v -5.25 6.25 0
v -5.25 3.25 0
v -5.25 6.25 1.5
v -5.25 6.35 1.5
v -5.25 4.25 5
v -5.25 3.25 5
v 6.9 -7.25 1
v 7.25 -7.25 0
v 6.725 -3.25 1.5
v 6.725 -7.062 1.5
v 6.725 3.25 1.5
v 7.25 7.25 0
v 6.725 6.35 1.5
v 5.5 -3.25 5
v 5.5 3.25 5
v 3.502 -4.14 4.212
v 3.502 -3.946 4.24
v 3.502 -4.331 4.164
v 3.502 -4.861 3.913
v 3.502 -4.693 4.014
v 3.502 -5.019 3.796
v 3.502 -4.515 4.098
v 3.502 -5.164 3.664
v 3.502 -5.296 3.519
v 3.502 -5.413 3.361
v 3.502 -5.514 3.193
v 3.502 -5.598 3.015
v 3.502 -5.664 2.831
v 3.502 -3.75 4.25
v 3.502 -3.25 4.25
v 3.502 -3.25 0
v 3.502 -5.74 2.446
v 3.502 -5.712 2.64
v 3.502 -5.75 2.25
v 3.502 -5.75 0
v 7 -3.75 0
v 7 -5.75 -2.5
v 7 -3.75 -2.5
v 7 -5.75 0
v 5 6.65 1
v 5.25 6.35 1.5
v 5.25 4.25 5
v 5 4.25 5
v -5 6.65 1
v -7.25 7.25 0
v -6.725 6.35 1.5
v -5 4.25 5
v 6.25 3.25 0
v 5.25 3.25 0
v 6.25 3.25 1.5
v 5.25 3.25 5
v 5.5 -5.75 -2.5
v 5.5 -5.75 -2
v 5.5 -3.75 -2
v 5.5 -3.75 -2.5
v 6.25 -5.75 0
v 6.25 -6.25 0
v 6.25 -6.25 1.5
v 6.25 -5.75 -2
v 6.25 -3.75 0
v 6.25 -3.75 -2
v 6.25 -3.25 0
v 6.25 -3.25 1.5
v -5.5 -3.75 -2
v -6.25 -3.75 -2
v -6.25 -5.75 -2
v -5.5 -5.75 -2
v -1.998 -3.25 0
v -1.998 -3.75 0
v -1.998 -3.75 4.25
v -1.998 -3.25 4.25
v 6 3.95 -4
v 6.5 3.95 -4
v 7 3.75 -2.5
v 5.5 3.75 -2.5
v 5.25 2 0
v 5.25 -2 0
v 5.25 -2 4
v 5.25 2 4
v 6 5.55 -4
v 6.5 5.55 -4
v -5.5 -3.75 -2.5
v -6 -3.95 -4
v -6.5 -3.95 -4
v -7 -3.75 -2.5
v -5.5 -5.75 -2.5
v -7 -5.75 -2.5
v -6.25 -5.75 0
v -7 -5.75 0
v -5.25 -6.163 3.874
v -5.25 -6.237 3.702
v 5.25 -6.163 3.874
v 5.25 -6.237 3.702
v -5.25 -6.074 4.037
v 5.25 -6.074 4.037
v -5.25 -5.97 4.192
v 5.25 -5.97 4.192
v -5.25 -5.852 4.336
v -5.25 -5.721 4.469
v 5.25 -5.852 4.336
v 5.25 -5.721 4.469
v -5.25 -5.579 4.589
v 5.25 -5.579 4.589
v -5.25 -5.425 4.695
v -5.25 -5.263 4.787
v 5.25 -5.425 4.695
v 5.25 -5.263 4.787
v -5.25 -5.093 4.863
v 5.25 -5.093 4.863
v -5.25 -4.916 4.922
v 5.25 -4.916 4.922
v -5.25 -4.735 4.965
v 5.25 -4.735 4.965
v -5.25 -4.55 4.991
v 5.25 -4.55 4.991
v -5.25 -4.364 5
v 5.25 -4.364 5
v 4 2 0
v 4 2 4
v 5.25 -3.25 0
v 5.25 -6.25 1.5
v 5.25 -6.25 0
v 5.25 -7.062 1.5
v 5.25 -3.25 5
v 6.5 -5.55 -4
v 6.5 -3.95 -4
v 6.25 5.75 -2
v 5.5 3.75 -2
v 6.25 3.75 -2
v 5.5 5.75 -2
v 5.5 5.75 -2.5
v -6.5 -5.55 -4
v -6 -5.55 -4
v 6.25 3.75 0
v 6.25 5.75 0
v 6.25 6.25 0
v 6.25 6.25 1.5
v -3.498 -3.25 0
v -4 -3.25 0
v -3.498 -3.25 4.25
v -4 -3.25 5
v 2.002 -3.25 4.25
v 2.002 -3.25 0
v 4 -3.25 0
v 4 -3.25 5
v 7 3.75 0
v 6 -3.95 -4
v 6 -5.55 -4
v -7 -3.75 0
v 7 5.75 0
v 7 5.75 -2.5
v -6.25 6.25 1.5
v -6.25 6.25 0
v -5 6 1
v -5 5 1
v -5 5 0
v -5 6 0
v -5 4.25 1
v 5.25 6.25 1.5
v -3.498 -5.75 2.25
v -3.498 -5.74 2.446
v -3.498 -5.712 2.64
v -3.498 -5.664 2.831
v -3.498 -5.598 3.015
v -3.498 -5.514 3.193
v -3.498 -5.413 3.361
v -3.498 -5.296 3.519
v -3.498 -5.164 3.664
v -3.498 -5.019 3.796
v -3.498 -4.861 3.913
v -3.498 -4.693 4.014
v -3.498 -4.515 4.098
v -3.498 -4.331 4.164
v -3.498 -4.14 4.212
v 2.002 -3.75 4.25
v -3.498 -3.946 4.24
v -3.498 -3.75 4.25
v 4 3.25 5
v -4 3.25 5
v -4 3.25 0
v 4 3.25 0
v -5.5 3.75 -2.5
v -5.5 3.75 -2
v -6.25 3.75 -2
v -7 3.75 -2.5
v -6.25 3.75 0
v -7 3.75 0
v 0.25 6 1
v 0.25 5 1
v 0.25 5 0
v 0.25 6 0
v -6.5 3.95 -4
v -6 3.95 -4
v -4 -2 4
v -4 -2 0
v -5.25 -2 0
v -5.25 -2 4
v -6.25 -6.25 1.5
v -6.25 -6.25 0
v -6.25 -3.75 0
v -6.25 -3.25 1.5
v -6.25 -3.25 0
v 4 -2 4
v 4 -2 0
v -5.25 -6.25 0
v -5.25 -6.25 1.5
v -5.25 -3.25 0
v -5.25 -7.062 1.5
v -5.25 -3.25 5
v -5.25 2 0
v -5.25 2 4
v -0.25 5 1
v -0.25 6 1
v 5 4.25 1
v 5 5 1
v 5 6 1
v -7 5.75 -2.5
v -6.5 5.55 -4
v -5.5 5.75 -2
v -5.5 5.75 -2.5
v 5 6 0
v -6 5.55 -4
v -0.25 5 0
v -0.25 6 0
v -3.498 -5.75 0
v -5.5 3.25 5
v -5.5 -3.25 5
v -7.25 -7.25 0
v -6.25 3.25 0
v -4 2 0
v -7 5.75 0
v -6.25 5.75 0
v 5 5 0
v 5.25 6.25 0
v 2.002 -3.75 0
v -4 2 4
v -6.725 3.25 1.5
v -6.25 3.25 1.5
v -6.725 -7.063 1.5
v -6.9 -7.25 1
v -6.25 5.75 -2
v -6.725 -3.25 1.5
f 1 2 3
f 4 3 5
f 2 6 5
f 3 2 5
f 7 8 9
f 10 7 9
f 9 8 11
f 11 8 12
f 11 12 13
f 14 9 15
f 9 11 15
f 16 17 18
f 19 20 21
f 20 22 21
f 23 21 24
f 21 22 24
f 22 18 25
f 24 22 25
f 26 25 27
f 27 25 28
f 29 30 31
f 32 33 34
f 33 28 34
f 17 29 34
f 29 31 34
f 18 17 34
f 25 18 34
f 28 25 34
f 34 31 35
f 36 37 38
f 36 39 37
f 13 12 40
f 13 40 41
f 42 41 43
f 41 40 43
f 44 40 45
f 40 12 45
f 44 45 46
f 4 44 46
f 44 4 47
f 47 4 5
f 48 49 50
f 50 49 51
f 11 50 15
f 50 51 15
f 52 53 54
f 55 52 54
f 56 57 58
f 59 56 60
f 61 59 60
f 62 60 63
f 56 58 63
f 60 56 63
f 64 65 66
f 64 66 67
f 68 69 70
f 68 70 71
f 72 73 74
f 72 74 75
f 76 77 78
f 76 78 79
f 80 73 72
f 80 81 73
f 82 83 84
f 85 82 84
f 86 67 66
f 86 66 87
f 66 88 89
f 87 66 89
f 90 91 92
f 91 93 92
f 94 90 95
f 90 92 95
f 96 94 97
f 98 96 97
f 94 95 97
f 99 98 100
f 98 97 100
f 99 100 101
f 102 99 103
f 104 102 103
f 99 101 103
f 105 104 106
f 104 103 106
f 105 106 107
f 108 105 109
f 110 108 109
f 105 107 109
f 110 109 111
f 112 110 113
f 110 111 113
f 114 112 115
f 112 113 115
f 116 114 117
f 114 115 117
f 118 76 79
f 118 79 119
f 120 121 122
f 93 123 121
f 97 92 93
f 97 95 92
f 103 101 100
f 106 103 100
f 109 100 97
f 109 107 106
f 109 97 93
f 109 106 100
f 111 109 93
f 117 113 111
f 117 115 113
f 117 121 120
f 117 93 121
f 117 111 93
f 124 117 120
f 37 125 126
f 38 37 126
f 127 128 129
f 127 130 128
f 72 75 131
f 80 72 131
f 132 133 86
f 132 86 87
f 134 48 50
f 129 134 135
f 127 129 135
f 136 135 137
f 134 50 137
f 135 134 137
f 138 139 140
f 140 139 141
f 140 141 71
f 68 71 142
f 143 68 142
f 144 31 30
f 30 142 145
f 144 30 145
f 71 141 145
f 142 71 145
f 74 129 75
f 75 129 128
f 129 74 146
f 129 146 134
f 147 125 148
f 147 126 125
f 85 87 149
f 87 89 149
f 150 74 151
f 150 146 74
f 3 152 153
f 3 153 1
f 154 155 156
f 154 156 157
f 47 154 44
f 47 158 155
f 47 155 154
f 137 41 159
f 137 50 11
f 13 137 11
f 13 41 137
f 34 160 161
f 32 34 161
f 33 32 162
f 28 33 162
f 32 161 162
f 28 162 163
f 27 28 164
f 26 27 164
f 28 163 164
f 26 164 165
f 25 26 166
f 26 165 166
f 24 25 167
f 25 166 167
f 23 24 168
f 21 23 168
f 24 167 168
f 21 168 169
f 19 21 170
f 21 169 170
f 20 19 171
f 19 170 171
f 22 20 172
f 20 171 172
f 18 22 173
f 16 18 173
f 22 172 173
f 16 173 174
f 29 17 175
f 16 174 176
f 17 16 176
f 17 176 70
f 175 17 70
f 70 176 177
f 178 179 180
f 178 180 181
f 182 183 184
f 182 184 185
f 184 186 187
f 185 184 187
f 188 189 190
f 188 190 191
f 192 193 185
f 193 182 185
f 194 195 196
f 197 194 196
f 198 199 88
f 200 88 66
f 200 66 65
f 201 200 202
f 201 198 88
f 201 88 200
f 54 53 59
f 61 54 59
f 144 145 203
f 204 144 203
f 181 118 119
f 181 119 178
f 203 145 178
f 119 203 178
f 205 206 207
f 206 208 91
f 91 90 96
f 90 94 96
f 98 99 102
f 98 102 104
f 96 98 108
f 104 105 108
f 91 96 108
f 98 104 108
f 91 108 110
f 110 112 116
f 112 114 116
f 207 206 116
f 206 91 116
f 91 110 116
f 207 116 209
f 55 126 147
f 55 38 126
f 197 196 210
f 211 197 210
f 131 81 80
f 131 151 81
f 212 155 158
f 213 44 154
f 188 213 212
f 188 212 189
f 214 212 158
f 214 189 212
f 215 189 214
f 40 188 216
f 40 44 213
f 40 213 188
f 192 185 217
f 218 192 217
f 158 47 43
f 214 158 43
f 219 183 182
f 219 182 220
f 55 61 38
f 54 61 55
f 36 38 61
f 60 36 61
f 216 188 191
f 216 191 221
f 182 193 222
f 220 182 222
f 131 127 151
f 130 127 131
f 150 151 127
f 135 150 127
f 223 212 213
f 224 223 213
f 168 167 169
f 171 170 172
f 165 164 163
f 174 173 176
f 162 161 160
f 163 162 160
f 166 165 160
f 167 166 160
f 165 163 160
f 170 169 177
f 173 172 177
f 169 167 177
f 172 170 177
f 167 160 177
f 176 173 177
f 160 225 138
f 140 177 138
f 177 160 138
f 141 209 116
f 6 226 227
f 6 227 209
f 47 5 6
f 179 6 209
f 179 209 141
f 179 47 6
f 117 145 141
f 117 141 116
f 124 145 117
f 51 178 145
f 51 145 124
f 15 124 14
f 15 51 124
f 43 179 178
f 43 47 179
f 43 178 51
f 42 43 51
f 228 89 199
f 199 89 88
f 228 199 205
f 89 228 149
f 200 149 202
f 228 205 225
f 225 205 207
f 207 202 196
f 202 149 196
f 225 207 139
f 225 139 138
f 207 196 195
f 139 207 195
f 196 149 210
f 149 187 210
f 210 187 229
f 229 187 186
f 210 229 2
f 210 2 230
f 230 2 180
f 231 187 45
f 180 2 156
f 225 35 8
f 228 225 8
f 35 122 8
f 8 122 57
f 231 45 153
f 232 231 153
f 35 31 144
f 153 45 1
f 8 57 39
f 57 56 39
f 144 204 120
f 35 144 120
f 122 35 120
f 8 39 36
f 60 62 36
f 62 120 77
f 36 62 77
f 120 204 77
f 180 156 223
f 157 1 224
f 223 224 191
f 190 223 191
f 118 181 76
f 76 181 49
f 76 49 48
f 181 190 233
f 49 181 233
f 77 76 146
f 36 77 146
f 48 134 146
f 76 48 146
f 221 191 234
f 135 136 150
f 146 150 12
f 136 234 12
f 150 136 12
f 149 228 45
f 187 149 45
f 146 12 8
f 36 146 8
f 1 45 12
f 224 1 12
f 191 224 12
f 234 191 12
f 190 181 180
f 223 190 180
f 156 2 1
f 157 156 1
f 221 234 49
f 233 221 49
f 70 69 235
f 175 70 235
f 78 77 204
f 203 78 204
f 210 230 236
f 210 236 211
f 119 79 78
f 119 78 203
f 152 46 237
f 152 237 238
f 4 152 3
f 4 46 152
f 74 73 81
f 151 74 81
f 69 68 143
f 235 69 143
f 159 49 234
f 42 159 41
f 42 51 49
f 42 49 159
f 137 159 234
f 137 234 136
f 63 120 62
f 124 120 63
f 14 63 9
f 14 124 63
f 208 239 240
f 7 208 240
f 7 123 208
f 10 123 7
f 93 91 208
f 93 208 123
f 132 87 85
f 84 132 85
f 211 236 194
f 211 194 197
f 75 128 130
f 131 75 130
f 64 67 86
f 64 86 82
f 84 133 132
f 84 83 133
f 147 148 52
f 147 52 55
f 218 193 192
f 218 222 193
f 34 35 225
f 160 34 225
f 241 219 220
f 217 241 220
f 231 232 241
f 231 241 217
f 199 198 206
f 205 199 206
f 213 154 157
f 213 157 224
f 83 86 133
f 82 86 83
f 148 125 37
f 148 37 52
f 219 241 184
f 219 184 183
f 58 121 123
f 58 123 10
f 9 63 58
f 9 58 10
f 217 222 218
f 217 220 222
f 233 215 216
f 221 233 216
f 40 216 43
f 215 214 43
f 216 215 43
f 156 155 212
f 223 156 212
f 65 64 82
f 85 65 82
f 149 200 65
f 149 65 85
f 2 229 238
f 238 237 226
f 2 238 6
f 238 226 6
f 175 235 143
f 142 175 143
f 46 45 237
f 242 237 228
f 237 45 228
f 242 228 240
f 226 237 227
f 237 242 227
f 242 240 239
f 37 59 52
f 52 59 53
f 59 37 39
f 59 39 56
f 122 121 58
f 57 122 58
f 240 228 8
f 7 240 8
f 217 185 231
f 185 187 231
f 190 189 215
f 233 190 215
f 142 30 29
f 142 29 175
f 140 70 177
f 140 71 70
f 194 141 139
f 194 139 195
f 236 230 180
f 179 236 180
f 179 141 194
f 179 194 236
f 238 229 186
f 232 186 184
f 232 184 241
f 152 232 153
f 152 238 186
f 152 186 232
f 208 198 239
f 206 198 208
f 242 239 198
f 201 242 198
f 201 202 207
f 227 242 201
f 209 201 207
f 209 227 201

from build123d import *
from OCP.BRepFilletAPI import BRepFilletAPI_MakeChamfer

# Parameters (mm, degrees)
ESQUISSE1_W             = 14.5
ESQUISSE1_H             = 14.5
BOSS_EXTRU_1_DEPTH      = 5
ESQUISSE2_W             = 8
ESQUISSE2_H             = 6.5
ENL_V_MAT_EXTRU_1_DEPTH = 12.407234547
CHANFREIN1_SIZE         = 5
CHANFREIN1_SIZE_2       = 1.75
CHANFREIN2_SIZE         = 5
CHANFREIN2_SIZE_2       = 3
ESQUISSE3_W             = 2
ESQUISSE3_H             = 4
ENL_V_MAT_EXTRU_2_DEPTH = 3.5
ESQUISSE6_W             = 10
ESQUISSE6_H             = 3
ENL_V_MAT_EXTRU_3_DEPTH = 4
CHANFREIN3_SIZE         = 4
CHANFREIN3_SIZE2        = 1.5
CONG_1_R                = 2
ESQUISSE7_W             = 1.25
ESQUISSE7_H             = 4
ENL_V_MAT_EXTRU_4_DEPTH = 4
ESQUISSE8_W             = 1.5
ESQUISSE8_H             = 2
BOSS_EXTRU_2_DEPTH      = 4
CHANFREIN4_SIZE         = 0.2
CHANFREIN4_SIZE2        = 1.5
CHANFREIN5_SIZE         = 1.5
CHANFREIN5_SIZE2        = 0.2
CHANFREIN6_SIZE         = 0.5
CHANFREIN6_SIZE2        = 1.5
CHANFREIN7_SIZE         = 1.5
CHANFREIN7_SIZE2        = 0.5
ESQUISSE9_W             = 1
ESQUISSE9_H             = 3
ENL_V_MAT_EXTRU_5_DEPTH = 3.5
ESQUISSE10_W            = 4.75
ESQUISSE10_H            = 1
ENL_V_MAT_EXTRU_6_DEPTH = 12.407234547
ESQUISSE11_W            = 1.5
ESQUISSE11_H            = 0.5
ENL_V_MAT_EXTRU_7_DEPTH = 4.25
CONG_2_START            = -3.497851783
CONG_2_DEPTH            = 7


with BuildPart() as part:
    # Esquisse1 → Boss.-Extru.1 (new body)
    with BuildSketch(Plane.XY):
        Rectangle(ESQUISSE1_W, ESQUISSE1_H)
    extrude(amount=BOSS_EXTRU_1_DEPTH)

    # Esquisse2 → Enlèv. mat.-Extru.1 (cut, through all)
    with BuildSketch(Plane.XY.offset(5)):
        Rectangle(ESQUISSE2_W, ESQUISSE2_H)
    extrude(amount=-ENL_V_MAT_EXTRU_1_DEPTH, mode=Mode.SUBTRACT)

    # Chanfrein1
    # the kernel refuses this chamfer: 5, 1.75 mm, written as the material it takes off along each edge
    with BuildSketch(Plane(origin=(7.25, 20.222980747, 5), x_dir=(0, 0, -1), z_dir=(0, -1, 0)), Plane(origin=(-7.25, -20.222980747, 5), x_dir=(0, 0, -1), z_dir=(0, 1, 0))) as chanfrein1_piece_1:
        Polygon((CHANFREIN1_SIZE, 0), (0, -CHANFREIN1_SIZE_2), (0, 0), align=None)
    extrude(amount=40.445961493, mode=Mode.SUBTRACT)

    # Chanfrein2
    # the kernel refuses this chamfer: 5, 3 mm, written as the material it takes off along each edge
    with BuildSketch(Plane(origin=(-18.431305486, 7.25, 5), x_dir=(0, 0, -1), z_dir=(1, 0, 0))) as chanfrein2_piece_1:
        Polygon((CHANFREIN2_SIZE, 0), (0, -CHANFREIN2_SIZE_2), (0, 0), align=None)
    extrude(amount=36.862610972, mode=Mode.SUBTRACT)

    # Esquisse3 → Enlèv. mat.-Extru.2 (cut)
    with BuildSketch(Plane.XY.offset(5)):
        with Locations((-6.25, 5.25)):
            Rectangle(ESQUISSE3_W, ESQUISSE3_H)
        with Locations((6.25, 5.25)):
            Rectangle(ESQUISSE3_W, ESQUISSE3_H)
        with Locations((6.25, -5.25)):
            Rectangle(ESQUISSE3_W, ESQUISSE3_H)
        with Locations((-6.25, -5.25)):
            Rectangle(ESQUISSE3_W, ESQUISSE3_H)
    extrude(amount=-ENL_V_MAT_EXTRU_2_DEPTH, mode=Mode.SUBTRACT)

    # Esquisse6 → Enlèv. mat.-Extru.3 (cut)
    with BuildSketch(Plane.XY.offset(5)):
        with Locations((0, 5.75)):
            Rectangle(ESQUISSE6_W, ESQUISSE6_H)
    extrude(amount=-ENL_V_MAT_EXTRU_3_DEPTH, mode=Mode.SUBTRACT)

    # Chanfrein3
    chanfrein3_edges = [part.edges().sort_by_distance(p)[0] for p in [
        (0, -7.25, 5),
    ]]
    chanfrein3_side = [part.faces().sort_by_distance(p)[0] for p in [
        (0, -7.25, 2.338531514),
    ]]
    chamfer(chanfrein3_edges, length=CHANFREIN3_SIZE, length2=CHANFREIN3_SIZE2, reference=chanfrein3_side[0])

    # Congé1
    cong_1_edges = [part.edges().sort_by_distance(p)[0] for p in [
        (0, -5.75, 5),
    ]]
    fillet(cong_1_edges, radius=CONG_1_R)

    # Esquisse7 → Enlèv. mat.-Extru.4 (cut)
    with BuildSketch(Plane(origin=(0, 0, 0), x_dir=(-1, 0, 0), z_dir=(0, 0, -1))):
        with Locations((-4.625, 0)):
            Rectangle(ESQUISSE7_W, ESQUISSE7_H)
        with Locations((4.625, 0)):
            Rectangle(ESQUISSE7_W, ESQUISSE7_H)
    extrude(amount=-ENL_V_MAT_EXTRU_4_DEPTH, mode=Mode.SUBTRACT)

    # Esquisse8 → Boss.-Extru.2 (add)
    with BuildSketch(Plane(origin=(0, 0, 0), x_dir=(-1, 0, 0), z_dir=(0, 0, -1))):
        with Locations((-6.25, 4.75)):
            Rectangle(ESQUISSE8_W, ESQUISSE8_H)
        with Locations((6.25, 4.75)):
            Rectangle(ESQUISSE8_W, ESQUISSE8_H)
        with Locations((6.25, -4.75)):
            Rectangle(ESQUISSE8_W, ESQUISSE8_H)
        with Locations((-6.25, -4.75)):
            Rectangle(ESQUISSE8_W, ESQUISSE8_H)
    extrude(amount=BOSS_EXTRU_2_DEPTH)

    # Chanfrein4: one chamfer whose edges measure the first distance from different faces: ONE call of the kernel's chamfer builder (chamfer() names one face for all edges)
    chanfrein4_edges_1 = [part.edges().sort_by_distance(p)[0] for p in [
        (6.25, 5.75, -4),
    ]]
    chanfrein4_side_1 = [part.faces().sort_by_distance(p)[0] for p in [
        (6.25, 4.75, -4),
    ]]
    chanfrein4_edges_2 = [part.edges().sort_by_distance(p)[0] for p in [
        (-6.25, 3.75, -4),
        (-6.25, 5.75, -4),
    ]]
    chanfrein4_side_2 = [part.faces().sort_by_distance(p)[0] for p in [
        (-6.25, 4.75, -4),
    ]]
    chanfrein4_edges_3 = [part.edges().sort_by_distance(p)[0] for p in [
        (6.25, -3.75, -4),
    ]]
    chanfrein4_side_3 = [part.faces().sort_by_distance(p)[0] for p in [
        (6.25, -4.75, -4),
    ]]
    chanfrein4 = BRepFilletAPI_MakeChamfer(part.part.solid().wrapped)
    for e in chanfrein4_edges_1:
        chanfrein4.Add(CHANFREIN4_SIZE, CHANFREIN4_SIZE2, e.wrapped, chanfrein4_side_1[0].wrapped)  # the first distance lies on this face
    for e in chanfrein4_edges_2:
        chanfrein4.Add(CHANFREIN4_SIZE, CHANFREIN4_SIZE2, e.wrapped, chanfrein4_side_2[0].wrapped)  # the first distance lies on this face
    for e in chanfrein4_edges_3:
        chanfrein4.Add(CHANFREIN4_SIZE, CHANFREIN4_SIZE2, e.wrapped, chanfrein4_side_3[0].wrapped)  # the first distance lies on this face
    add(Compound.cast(chanfrein4.Shape()), mode=Mode.REPLACE)

    # Chanfrein5: one chamfer whose edges measure the first distance from different faces: ONE call of the kernel's chamfer builder (chamfer() names one face for all edges)
    chanfrein5_edges_1 = [part.edges().sort_by_distance(p)[0] for p in [
        (6.25, 3.75, -4),
    ]]
    chanfrein5_side_1 = [part.faces().sort_by_distance(p)[0] for p in [
        (6.25, 3.75, -2),
    ]]
    chanfrein5_edges_2 = [part.edges().sort_by_distance(p)[0] for p in [
        (-6.25, -5.75, -4),
    ]]
    chanfrein5_side_2 = [part.faces().sort_by_distance(p)[0] for p in [
        (-6.25, -5.75, -2),
    ]]
    chanfrein5_edges_3 = [part.edges().sort_by_distance(p)[0] for p in [
        (-6.25, -3.75, -4),
    ]]
    chanfrein5_side_3 = [part.faces().sort_by_distance(p)[0] for p in [
        (-6.25, -3.75, -2),
    ]]
    chanfrein5_edges_4 = [part.edges().sort_by_distance(p)[0] for p in [
        (6.25, -5.75, -4),
    ]]
    chanfrein5_side_4 = [part.faces().sort_by_distance(p)[0] for p in [
        (6.25, -5.75, -2),
    ]]
    chanfrein5 = BRepFilletAPI_MakeChamfer(part.part.solid().wrapped)
    for e in chanfrein5_edges_1:
        chanfrein5.Add(CHANFREIN5_SIZE, CHANFREIN5_SIZE2, e.wrapped, chanfrein5_side_1[0].wrapped)  # the first distance lies on this face
    for e in chanfrein5_edges_2:
        chanfrein5.Add(CHANFREIN5_SIZE, CHANFREIN5_SIZE2, e.wrapped, chanfrein5_side_2[0].wrapped)  # the first distance lies on this face
    for e in chanfrein5_edges_3:
        chanfrein5.Add(CHANFREIN5_SIZE, CHANFREIN5_SIZE2, e.wrapped, chanfrein5_side_3[0].wrapped)  # the first distance lies on this face
    for e in chanfrein5_edges_4:
        chanfrein5.Add(CHANFREIN5_SIZE, CHANFREIN5_SIZE2, e.wrapped, chanfrein5_side_4[0].wrapped)  # the first distance lies on this face
    add(Compound.cast(chanfrein5.Shape()), mode=Mode.REPLACE)

    # Chanfrein6: one chamfer whose edges measure the first distance from different faces: ONE call of the kernel's chamfer builder (chamfer() names one face for all edges)
    chanfrein6_edges_1 = [part.edges().sort_by_distance(p)[0] for p in [
        (5.5, 4.75, -4),
    ]]
    chanfrein6_side_1 = [part.faces().sort_by_distance(p)[0] for p in [
        (6.25, 4.75, -4),
    ]]
    chanfrein6_edges_2 = [part.edges().sort_by_distance(p)[0] for p in [
        (-7, 4.75, -4),
    ]]
    chanfrein6_side_2 = [part.faces().sort_by_distance(p)[0] for p in [
        (-6.25, 4.75, -4),
    ]]
    chanfrein6_edges_3 = [part.edges().sort_by_distance(p)[0] for p in [
        (-5.5, -4.75, -4),
        (-7, -4.75, -4),
    ]]
    chanfrein6_side_3 = [part.faces().sort_by_distance(p)[0] for p in [
        (-6.25, -4.75, -4),
    ]]
    chanfrein6 = BRepFilletAPI_MakeChamfer(part.part.solid().wrapped)
    for e in chanfrein6_edges_1:
        chanfrein6.Add(CHANFREIN6_SIZE, CHANFREIN6_SIZE2, e.wrapped, chanfrein6_side_1[0].wrapped)  # the first distance lies on this face
    for e in chanfrein6_edges_2:
        chanfrein6.Add(CHANFREIN6_SIZE, CHANFREIN6_SIZE2, e.wrapped, chanfrein6_side_2[0].wrapped)  # the first distance lies on this face
    for e in chanfrein6_edges_3:
        chanfrein6.Add(CHANFREIN6_SIZE, CHANFREIN6_SIZE2, e.wrapped, chanfrein6_side_3[0].wrapped)  # the first distance lies on this face
    add(Compound.cast(chanfrein6.Shape()), mode=Mode.REPLACE)

    # Chanfrein7: one chamfer whose edges measure the first distance from different faces: ONE call of the kernel's chamfer builder (chamfer() names one face for all edges)
    chanfrein7_edges_1 = [part.edges().sort_by_distance(p)[0] for p in [
        (5.5, -4.75, -4),
    ]]
    chanfrein7_side_1 = [part.faces().sort_by_distance(p)[0] for p in [
        (5.5, -4.75, -1.941558442),
    ]]
    chanfrein7_edges_2 = [part.edges().sort_by_distance(p)[0] for p in [
        (-5.5, 4.75, -4),
    ]]
    chanfrein7_side_2 = [part.faces().sort_by_distance(p)[0] for p in [
        (-5.5, 4.75, -1.941558442),
    ]]
    chanfrein7_edges_3 = [part.edges().sort_by_distance(p)[0] for p in [
        (7, 4.75, -4),
    ]]
    chanfrein7_side_3 = [part.faces().sort_by_distance(p)[0] for p in [
        (7, 4.75, -1.941558442),
    ]]
    chanfrein7_edges_4 = [part.edges().sort_by_distance(p)[0] for p in [
        (7, -4.75, -4),
    ]]
    chanfrein7_side_4 = [part.faces().sort_by_distance(p)[0] for p in [
        (7, -4.75, -1.941558442),
    ]]
    chanfrein7 = BRepFilletAPI_MakeChamfer(part.part.solid().wrapped)
    for e in chanfrein7_edges_1:
        chanfrein7.Add(CHANFREIN7_SIZE, CHANFREIN7_SIZE2, e.wrapped, chanfrein7_side_1[0].wrapped)  # the first distance lies on this face
    for e in chanfrein7_edges_2:
        chanfrein7.Add(CHANFREIN7_SIZE, CHANFREIN7_SIZE2, e.wrapped, chanfrein7_side_2[0].wrapped)  # the first distance lies on this face
    for e in chanfrein7_edges_3:
        chanfrein7.Add(CHANFREIN7_SIZE, CHANFREIN7_SIZE2, e.wrapped, chanfrein7_side_3[0].wrapped)  # the first distance lies on this face
    for e in chanfrein7_edges_4:
        chanfrein7.Add(CHANFREIN7_SIZE, CHANFREIN7_SIZE2, e.wrapped, chanfrein7_side_4[0].wrapped)  # the first distance lies on this face
    add(Compound.cast(chanfrein7.Shape()), mode=Mode.REPLACE)

    # Esquisse9 → Enlèv. mat.-Extru.5 (cut)
    with BuildSketch(Plane.XY.offset(1.5)):
        with Locations((-5.75, 4.75)):
            Rectangle(ESQUISSE9_W, ESQUISSE9_H)
        with Locations((-5.75, -4.75)):
            Rectangle(ESQUISSE9_W, ESQUISSE9_H)
        with Locations((5.75, -4.75)):
            Rectangle(ESQUISSE9_W, ESQUISSE9_H)
        with Locations((5.75, 4.75)):
            Rectangle(ESQUISSE9_W, ESQUISSE9_H)
    extrude(amount=-ENL_V_MAT_EXTRU_5_DEPTH, mode=Mode.SUBTRACT)

    # Esquisse10 → Enlèv. mat.-Extru.6 (cut, through all)
    with BuildSketch(Plane.XY.offset(1)):
        with Locations((-2.625, 5.5)):
            Rectangle(ESQUISSE10_W, ESQUISSE10_H)
        with Locations((2.625, 5.5)):
            Rectangle(ESQUISSE10_W, ESQUISSE10_H)
    extrude(amount=-ENL_V_MAT_EXTRU_6_DEPTH, mode=Mode.SUBTRACT)

    # Esquisse11 → Enlèv. mat.-Extru.7 (cut)
    with BuildSketch(Plane(origin=(0, 0, 0), x_dir=(-1, 0, 0), z_dir=(0, 0, -1))):
        Polygon((-3.502148217, -3.75), (-3.502148217, -5.75), (0, -5.75), (3.497851783, -5.75), (3.497851783, -3.75), align=None)
        with Locations((2.747851783, -3.5)):
            Rectangle(ESQUISSE11_W, ESQUISSE11_H)
        with Locations((-2.752148217, -3.5)):
            Rectangle(ESQUISSE11_W, ESQUISSE11_H)
    extrude(amount=-ENL_V_MAT_EXTRU_7_DEPTH, mode=Mode.SUBTRACT)

    # Congé2: read off the stored shape, not the designer's step
    # Congé2 outline → Congé2 (add)
    with BuildSketch(Plane.YZ.offset(CONG_2_START)):
        with BuildLine():
            Line((-5.75, 4.25), (-5.75, 2.25))
            ThreePointArc((-5.75, 2.25), (-5.164213562, 3.664213562), (-3.75, 4.25))
            Line((-3.75, 4.25), (-5.75, 4.25))
        make_face()
    extrude(amount=CONG_2_DEPTH)


solid = part.part
